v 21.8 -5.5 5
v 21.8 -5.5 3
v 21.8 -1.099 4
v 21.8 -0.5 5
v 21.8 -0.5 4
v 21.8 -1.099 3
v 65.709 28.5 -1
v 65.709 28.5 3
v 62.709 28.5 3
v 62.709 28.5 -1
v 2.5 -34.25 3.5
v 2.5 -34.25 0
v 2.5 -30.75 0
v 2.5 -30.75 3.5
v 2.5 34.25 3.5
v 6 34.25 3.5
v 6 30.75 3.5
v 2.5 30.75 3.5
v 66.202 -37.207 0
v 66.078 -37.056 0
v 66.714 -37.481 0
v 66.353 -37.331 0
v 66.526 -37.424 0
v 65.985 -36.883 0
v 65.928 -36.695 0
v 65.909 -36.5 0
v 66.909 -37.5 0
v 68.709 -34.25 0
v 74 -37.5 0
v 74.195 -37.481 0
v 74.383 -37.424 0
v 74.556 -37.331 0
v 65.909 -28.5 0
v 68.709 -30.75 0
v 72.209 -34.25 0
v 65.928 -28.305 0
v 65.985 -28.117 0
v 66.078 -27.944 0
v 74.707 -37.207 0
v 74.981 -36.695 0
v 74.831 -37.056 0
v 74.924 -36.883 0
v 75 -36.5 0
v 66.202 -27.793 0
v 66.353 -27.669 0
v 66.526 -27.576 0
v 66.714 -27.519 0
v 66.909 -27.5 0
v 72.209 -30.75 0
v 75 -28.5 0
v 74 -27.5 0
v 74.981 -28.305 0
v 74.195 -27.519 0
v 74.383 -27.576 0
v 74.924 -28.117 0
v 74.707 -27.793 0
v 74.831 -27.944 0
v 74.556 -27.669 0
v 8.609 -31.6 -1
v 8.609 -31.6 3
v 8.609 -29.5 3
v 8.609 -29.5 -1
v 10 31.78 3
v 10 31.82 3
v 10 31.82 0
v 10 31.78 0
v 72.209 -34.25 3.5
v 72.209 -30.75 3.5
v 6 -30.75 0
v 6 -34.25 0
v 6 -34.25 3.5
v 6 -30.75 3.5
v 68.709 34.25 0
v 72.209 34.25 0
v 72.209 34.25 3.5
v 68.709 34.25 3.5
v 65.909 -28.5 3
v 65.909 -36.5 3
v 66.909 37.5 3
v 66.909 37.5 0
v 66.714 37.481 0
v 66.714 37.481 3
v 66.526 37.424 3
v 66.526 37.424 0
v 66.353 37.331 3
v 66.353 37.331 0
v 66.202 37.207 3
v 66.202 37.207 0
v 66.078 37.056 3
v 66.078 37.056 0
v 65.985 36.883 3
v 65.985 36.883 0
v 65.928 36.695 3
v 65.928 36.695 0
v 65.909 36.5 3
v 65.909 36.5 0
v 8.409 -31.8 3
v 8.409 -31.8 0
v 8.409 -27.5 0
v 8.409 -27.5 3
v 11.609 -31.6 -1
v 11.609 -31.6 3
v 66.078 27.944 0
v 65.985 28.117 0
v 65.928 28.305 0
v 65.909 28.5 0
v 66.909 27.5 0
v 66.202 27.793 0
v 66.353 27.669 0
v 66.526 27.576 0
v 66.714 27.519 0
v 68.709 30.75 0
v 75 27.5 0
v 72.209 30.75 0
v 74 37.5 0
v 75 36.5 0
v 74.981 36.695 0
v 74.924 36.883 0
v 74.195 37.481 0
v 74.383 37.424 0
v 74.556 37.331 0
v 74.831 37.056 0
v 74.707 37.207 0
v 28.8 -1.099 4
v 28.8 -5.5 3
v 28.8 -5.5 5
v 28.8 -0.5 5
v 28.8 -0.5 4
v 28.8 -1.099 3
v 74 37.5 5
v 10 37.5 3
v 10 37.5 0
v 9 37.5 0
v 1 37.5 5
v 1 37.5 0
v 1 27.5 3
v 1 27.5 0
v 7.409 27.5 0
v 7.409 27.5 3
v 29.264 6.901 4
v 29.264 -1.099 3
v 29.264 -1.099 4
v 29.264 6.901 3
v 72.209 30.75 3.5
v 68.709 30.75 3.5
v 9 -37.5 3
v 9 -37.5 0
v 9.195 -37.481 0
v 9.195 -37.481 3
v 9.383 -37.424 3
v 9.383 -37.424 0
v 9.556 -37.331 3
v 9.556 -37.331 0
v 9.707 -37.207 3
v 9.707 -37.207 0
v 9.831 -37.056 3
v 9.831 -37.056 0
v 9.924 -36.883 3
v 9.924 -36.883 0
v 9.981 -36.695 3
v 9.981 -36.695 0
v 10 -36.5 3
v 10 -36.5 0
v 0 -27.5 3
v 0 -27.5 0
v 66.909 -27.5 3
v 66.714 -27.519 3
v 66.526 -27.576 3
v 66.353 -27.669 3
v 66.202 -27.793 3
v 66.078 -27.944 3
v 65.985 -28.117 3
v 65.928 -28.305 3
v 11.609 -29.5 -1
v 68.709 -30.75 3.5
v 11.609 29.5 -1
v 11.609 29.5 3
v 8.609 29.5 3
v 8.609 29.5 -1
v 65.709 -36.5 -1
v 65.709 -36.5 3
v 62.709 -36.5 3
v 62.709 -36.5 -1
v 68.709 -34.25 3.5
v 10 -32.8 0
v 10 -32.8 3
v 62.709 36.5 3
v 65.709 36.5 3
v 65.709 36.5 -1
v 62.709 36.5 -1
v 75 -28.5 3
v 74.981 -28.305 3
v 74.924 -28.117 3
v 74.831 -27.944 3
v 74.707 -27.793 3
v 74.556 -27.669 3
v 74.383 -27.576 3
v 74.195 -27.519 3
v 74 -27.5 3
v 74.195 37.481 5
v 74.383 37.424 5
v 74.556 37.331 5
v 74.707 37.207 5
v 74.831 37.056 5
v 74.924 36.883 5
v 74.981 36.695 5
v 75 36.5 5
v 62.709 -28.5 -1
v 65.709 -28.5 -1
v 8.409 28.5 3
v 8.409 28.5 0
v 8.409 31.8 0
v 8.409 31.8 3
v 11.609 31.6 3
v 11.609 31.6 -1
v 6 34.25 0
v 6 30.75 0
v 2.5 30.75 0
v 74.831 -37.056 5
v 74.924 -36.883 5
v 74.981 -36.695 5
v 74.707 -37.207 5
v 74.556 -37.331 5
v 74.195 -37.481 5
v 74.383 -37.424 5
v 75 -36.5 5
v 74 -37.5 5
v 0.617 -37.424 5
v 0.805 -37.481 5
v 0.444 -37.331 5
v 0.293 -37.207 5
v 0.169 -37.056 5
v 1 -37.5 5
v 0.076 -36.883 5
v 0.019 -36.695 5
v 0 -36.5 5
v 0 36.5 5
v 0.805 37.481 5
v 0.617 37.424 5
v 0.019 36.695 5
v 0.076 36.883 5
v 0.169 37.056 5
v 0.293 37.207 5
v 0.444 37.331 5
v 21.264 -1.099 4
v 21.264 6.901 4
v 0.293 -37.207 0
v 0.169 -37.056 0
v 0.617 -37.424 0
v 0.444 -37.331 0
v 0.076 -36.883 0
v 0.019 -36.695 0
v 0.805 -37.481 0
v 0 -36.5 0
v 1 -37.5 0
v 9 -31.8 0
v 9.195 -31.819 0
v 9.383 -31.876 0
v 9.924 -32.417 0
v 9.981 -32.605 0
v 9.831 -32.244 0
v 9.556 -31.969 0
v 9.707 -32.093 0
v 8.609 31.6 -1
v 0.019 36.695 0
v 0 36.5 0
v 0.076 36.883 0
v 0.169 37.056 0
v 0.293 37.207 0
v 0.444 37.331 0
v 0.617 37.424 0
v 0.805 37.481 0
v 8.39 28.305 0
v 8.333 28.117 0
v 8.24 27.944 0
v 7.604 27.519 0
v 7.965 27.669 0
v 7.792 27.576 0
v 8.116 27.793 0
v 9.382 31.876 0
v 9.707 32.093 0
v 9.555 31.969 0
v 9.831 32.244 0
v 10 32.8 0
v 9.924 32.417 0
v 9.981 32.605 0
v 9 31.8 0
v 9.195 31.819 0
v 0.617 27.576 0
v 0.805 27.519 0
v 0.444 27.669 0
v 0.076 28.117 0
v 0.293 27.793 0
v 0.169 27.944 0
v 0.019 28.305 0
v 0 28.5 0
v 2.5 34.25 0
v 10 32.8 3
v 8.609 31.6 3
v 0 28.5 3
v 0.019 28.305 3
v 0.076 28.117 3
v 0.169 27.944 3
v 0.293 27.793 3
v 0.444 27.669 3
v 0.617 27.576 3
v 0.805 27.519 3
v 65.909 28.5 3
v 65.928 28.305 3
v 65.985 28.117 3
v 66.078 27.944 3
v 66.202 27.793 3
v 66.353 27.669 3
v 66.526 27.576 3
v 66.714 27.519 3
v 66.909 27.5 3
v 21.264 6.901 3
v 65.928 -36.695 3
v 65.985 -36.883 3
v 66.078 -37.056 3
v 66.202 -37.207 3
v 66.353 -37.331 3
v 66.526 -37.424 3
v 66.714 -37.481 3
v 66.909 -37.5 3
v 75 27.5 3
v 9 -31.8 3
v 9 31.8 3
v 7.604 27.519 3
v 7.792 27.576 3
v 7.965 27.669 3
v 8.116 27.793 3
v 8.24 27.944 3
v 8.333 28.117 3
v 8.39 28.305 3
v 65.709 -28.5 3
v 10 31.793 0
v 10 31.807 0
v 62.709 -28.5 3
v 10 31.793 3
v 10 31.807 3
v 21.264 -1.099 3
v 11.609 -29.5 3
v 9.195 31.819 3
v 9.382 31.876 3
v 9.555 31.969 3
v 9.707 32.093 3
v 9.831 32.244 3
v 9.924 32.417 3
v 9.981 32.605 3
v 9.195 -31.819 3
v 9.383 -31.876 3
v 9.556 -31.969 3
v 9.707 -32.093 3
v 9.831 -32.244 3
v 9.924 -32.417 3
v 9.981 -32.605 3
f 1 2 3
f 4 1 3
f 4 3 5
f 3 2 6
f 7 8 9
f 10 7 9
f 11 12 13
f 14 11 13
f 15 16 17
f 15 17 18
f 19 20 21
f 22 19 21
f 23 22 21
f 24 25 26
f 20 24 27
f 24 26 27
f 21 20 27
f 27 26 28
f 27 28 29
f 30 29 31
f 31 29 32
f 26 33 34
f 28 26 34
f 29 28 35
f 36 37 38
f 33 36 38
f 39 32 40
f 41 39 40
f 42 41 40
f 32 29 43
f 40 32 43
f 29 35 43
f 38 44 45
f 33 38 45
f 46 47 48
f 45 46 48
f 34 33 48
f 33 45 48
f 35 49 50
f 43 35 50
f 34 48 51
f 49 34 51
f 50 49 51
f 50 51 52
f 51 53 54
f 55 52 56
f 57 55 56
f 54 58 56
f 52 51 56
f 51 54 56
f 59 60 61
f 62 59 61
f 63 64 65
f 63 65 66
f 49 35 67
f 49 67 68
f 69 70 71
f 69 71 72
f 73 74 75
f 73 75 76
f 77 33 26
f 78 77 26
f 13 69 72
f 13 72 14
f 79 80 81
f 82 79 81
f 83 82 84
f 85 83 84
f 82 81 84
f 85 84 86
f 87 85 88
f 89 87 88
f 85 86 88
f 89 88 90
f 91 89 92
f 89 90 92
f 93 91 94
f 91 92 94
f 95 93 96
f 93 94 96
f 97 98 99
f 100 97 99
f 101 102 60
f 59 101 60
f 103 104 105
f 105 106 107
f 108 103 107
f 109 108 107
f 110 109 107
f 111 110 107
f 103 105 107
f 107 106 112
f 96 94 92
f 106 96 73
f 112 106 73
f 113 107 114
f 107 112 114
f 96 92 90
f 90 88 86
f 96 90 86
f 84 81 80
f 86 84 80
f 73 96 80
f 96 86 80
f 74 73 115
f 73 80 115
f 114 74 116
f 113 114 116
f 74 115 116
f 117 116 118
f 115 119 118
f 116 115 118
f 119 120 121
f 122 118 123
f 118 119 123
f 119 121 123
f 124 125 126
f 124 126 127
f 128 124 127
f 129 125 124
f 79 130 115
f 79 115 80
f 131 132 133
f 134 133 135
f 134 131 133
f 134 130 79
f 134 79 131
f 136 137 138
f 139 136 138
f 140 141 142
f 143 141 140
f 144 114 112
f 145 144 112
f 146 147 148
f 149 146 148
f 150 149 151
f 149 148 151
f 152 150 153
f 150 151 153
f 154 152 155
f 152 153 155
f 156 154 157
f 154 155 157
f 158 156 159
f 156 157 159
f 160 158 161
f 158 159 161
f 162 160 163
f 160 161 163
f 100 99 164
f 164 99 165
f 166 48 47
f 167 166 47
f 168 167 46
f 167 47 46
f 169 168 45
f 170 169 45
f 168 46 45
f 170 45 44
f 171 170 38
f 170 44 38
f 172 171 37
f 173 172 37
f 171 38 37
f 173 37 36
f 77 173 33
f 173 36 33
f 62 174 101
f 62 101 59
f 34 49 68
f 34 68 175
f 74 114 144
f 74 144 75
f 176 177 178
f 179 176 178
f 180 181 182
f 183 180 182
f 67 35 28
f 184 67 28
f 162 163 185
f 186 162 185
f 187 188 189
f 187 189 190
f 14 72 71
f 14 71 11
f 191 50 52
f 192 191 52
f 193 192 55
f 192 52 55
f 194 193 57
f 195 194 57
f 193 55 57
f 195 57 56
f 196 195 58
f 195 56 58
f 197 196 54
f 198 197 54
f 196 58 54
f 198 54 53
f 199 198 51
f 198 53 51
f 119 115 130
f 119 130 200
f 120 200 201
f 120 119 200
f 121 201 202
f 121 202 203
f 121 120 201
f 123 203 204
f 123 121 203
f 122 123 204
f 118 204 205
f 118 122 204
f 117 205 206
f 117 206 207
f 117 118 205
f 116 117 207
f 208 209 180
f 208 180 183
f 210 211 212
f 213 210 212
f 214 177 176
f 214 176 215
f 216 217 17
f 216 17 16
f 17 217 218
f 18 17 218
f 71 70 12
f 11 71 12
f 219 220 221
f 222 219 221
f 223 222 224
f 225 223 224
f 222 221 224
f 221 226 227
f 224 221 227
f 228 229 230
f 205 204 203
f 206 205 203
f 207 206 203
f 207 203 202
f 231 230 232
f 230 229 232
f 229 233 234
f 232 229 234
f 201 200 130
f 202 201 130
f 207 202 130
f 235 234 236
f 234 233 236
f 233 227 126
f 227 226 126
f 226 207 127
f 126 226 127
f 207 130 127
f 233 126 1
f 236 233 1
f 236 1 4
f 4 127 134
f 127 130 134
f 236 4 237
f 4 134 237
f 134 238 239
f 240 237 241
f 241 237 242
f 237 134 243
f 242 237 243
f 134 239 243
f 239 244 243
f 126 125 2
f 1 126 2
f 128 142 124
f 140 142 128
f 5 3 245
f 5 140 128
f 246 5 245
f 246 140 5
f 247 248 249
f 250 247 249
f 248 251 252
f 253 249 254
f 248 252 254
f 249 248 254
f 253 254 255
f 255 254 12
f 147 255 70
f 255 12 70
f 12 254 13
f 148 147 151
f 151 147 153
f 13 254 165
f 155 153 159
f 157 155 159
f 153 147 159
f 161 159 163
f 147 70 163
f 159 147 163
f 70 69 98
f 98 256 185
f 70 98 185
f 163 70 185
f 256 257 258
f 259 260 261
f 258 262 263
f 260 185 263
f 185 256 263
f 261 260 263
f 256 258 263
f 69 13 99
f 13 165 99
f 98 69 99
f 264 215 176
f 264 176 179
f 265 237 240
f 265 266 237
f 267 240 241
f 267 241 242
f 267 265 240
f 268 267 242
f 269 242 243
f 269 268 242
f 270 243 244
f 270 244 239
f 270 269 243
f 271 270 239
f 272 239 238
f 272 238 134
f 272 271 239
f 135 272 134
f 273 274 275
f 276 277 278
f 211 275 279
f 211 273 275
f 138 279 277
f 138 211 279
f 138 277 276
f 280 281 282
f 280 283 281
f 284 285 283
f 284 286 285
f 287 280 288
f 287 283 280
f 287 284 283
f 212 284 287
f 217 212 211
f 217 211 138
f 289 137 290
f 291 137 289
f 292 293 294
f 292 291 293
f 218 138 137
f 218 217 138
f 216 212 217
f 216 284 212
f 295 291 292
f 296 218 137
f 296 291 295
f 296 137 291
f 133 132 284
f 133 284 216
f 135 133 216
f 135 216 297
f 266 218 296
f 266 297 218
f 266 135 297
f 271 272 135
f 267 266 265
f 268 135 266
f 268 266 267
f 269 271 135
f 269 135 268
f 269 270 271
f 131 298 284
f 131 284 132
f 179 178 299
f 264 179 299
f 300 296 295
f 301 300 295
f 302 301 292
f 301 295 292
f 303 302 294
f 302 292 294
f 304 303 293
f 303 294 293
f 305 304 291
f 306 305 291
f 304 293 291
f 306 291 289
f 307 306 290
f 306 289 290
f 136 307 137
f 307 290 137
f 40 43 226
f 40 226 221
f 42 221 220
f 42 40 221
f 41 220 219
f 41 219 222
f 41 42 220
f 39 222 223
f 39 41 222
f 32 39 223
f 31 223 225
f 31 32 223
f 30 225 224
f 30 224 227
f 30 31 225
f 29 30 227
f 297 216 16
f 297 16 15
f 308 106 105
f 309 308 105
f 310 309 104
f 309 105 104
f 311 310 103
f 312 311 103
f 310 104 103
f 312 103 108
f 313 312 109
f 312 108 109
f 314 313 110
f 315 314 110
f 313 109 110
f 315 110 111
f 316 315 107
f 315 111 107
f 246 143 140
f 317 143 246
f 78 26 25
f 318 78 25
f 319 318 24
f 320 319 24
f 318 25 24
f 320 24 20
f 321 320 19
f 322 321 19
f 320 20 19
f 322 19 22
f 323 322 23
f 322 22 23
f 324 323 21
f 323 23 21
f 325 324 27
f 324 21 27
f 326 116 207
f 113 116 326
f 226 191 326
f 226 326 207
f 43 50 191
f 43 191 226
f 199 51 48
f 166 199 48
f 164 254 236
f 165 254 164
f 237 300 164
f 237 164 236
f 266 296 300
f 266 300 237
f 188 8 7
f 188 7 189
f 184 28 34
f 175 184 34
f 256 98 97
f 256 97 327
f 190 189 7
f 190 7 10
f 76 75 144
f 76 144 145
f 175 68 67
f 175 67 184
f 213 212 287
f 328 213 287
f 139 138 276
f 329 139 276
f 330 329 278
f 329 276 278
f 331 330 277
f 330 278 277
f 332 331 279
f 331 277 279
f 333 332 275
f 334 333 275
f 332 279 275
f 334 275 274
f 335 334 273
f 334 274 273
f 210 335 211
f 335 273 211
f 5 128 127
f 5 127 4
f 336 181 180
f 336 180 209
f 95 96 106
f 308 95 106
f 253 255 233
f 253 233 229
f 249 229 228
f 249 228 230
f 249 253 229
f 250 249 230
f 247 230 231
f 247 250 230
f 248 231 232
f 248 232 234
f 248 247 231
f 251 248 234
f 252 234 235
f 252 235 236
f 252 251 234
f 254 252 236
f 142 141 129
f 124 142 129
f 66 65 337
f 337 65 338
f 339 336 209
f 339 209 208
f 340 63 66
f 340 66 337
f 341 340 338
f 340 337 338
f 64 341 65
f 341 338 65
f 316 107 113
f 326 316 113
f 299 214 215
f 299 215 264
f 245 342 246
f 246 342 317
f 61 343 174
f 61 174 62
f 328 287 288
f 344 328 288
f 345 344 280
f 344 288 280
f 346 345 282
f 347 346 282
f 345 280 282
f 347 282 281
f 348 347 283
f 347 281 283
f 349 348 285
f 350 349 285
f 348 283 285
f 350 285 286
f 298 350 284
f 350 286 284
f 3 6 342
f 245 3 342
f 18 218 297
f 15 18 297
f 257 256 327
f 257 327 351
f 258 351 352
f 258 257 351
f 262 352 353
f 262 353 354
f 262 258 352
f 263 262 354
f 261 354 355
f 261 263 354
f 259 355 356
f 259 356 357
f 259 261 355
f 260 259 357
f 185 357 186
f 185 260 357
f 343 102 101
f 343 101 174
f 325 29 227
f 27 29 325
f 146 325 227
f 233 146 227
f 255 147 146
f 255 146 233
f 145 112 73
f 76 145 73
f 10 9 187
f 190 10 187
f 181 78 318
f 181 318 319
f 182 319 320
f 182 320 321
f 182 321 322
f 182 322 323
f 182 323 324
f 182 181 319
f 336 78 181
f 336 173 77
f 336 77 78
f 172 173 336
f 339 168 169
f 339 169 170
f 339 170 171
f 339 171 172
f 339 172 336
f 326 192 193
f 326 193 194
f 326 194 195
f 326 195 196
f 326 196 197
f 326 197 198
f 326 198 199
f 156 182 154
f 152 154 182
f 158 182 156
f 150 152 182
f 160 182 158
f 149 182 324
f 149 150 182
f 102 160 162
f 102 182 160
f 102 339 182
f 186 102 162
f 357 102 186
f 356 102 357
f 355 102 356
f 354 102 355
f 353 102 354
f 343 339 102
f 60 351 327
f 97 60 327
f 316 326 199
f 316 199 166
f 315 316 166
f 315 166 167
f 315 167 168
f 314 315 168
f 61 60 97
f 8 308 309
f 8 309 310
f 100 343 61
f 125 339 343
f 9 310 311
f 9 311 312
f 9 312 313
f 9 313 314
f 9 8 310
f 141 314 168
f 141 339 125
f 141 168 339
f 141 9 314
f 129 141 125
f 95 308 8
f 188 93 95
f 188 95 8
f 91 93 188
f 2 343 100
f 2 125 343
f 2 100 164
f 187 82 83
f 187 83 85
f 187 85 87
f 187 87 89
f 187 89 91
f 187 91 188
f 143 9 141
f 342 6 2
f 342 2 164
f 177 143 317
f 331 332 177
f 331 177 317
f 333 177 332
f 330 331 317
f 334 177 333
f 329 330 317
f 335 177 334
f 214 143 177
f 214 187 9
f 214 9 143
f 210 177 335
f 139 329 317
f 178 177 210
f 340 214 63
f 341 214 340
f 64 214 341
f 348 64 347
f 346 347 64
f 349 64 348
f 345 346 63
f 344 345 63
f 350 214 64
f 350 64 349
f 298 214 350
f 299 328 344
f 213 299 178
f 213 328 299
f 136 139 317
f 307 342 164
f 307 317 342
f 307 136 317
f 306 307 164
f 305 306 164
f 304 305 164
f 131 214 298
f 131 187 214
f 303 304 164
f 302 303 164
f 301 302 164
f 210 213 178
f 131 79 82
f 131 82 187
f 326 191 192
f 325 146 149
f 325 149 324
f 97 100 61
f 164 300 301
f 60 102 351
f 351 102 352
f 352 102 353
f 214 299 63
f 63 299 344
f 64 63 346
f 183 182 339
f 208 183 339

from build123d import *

# Parameters (mm, degrees)
RESSALTO_EXTRUS_O1_DEPTH   = 3
RESSALTO_EXTRUS_O1_2_DEPTH = 3
RESSALTO_EXTRUS_O1_3_DEPTH = 3
RESSALTO_EXTRUS_O1_4_DEPTH = 3
RESSALTO_EXTRUS_O2_DEPTH   = 2
ESBO_O13_W                 = 0.999795876
ESBO_O13_H                 = 5.679795897
RESSALTO_EXTRUS_O3_DEPTH   = 3
CORTE_EXTRUS_O4_DEPTH      = 3
ESBO_O22_W                 = 3
ESBO_O22_H                 = 2.1
ESBO_O22_H_2               = 8
RESSALTO_EXTRUS_O5_DEPTH   = 4
ESBO_O15_W                 = 3.5
ESBO_O15_H                 = 3.5
CORTE_EXTRUS_O1_DEPTH      = 3.5
ESBO_O16_W                 = 8
ESBO_O16_H                 = 8
CORTE_EXTRUS_O2_DEPTH      = 1
ESBO_O18_W                 = 7
ESBO_O18_H                 = 5
CORTE_EXTRUS_O3_DEPTH      = 10


with BuildPart() as part:
    # Esboço1 → Ressalto-extrusão1 (new body)
    with BuildSketch(Plane.XY):
        with BuildLine():
            Line((10, -36.5), (10, -31.8))
            ThreePointArc((10, -31.8), (9.707106781, -31.092893219), (9, -30.8))
            Line((9, -30.8), (8.409000397, -30.8))
            Line((8.409000397, -30.8), (8.409000397, -27.5))
            Line((8.409000397, -27.5), (0, -27.5))
            Line((0, -27.5), (0, -36.5))
            ThreePointArc((0, -36.5), (0.292893219, -37.207106781), (1, -37.5))
            Line((1, -37.5), (9, -37.5))
            ThreePointArc((9, -37.5), (9.707106781, -37.207106781), (10, -36.5))
        make_face()
    extrude(amount=RESSALTO_EXTRUS_O1_DEPTH)



with BuildPart() as body_2:
    # Esboço1 → Ressalto-extrus_o1 2 (new body)
    with BuildSketch(Plane.XY):
        with BuildLine():
            Line((75, -36.5), (75, -28.5))
            ThreePointArc((75, -28.5), (74.707106781, -27.792893219), (74, -27.5))
            Line((74, -27.5), (66.909000397, -27.5))
            ThreePointArc((66.909000397, -27.5), (66.201893616, -27.792893219), (65.909000397, -28.5))
            Line((65.909000397, -28.5), (65.909000397, -36.5))
            ThreePointArc((65.909000397, -36.5), (66.201893616, -37.207106781), (66.909000397, -37.5))
            Line((66.909000397, -37.5), (74, -37.5))
            ThreePointArc((74, -37.5), (74.707106781, -37.207106781), (75, -36.5))
        make_face()
    extrude(amount=RESSALTO_EXTRUS_O1_2_DEPTH)


with BuildPart() as body_3:
    # Esboço1 → Ressalto-extrus_o1 3 (new body)
    with BuildSketch(Plane.XY):
        with BuildLine():
            Line((65.909000397, 36.5), (65.909000397, 28.5))
            ThreePointArc((65.909000397, 28.5), (66.201893616, 27.792893219), (66.909000397, 27.5))
            Line((66.909000397, 27.5), (75, 27.5))
            Line((75, 27.5), (75, 36.5))
            ThreePointArc((75, 36.5), (74.707106781, 37.207106781), (74, 37.5))
            Line((74, 37.5), (66.909000397, 37.5))
            ThreePointArc((66.909000397, 37.5), (66.201893616, 37.207106781), (65.909000397, 36.5))
        make_face()
    extrude(amount=RESSALTO_EXTRUS_O1_3_DEPTH)


with BuildPart() as body_4:
    # Esboço1 → Ressalto-extrus_o1 4 (new body)
    with BuildSketch(Plane.XY):
        with BuildLine():
            Line((9, 37.5), (1, 37.5))
            ThreePointArc((1, 37.5), (0.292893219, 37.207106781), (0, 36.5))
            Line((0, 36.5), (0, 28.5))
            ThreePointArc((0, 28.5), (0.292893219, 27.792893219), (1, 27.5))
            Line((1, 27.5), (7.409000397, 27.5))
            ThreePointArc((7.409000397, 27.5), (8.116107178, 27.792893219), (8.409000397, 28.5))
            Line((8.409000397, 28.5), (8.409000397, 30.8))
            Line((8.409000397, 30.8), (9, 30.8))
            ThreePointArc((9, 30.8), (9.71421429, 31.100072898), (9.999795876, 31.820204103))
            Line((9.999795876, 31.820204103), (9, 31.820204103))
            Line((9, 31.820204103), (9, 37.5))
        make_face()
    extrude(amount=RESSALTO_EXTRUS_O1_4_DEPTH)


with BuildPart() as part_1:
    add(part.part)

    add(body_2.part)  # Ressalto-extrusão2 merges body 2

    add(body_3.part)  # Ressalto-extrusão2 merges body 3

    add(body_4.part)  # Ressalto-extrusão2 merges body 4
    # Esboço2 → Ressalto-extrusão2 (add)
    with BuildSketch(Plane.XY.offset(3)):
        with BuildLine():
            Line((1, 37.5), (74, 37.5))
            ThreePointArc((74, 37.5), (74.707106781, 37.207106781), (75, 36.5))
            Line((75, 36.5), (75, -36.5))
            ThreePointArc((75, -36.5), (74.707106781, -37.207106781), (74, -37.5))
            Line((74, -37.5), (1, -37.5))
            ThreePointArc((1, -37.5), (0.292893219, -37.207106781), (0, -36.5))
            Line((0, -36.5), (0, 36.5))
            ThreePointArc((0, 36.5), (0.292893219, 37.207106781), (1, 37.5))
        make_face()
    extrude(amount=RESSALTO_EXTRUS_O2_DEPTH)

    # Esboço13 → Ressalto-extrusão3 (add)
    with BuildSketch(Plane(origin=(0, 0, 3), x_dir=(-1, 0, 0), z_dir=(0, 0, -1))):
        with Locations((-9.499897938, 34.660102052)):
            Rectangle(ESBO_O13_W, ESBO_O13_H)
    extrude(amount=RESSALTO_EXTRUS_O3_DEPTH)

    # Esboço20 → Corte-extrusão4 (cut)
    with BuildSketch(Plane(origin=(0, 0, 0), x_dir=(-1, 0, 0), z_dir=(0, 0, -1))):
        with BuildLine():
            Line((-8.409000397, 31.8), (-8.999795876, 31.8))
            ThreePointArc((-8.999795876, 31.8), (-9.706902657, 32.092893219), (-9.999795876, 32.8))
            Line((-9.999795876, 32.8), (-9.999795876, 30.8))
            Line((-9.999795876, 30.8), (-8.409000397, 30.8))
            Line((-8.409000397, 30.8), (-8.409000397, 31.8))
        make_face()
        with BuildLine():
            Line((-8.409000397, -30.8), (-8.409000397, -31.8))
            Line((-8.409000397, -31.8), (-9, -31.8))
            ThreePointArc((-9, -31.8), (-9.707106781, -32.092893219), (-10, -32.8))
            Line((-10, -32.8), (-10, -30.8))
            Line((-10, -30.8), (-8.409000397, -30.8))
        make_face()
    extrude(amount=-CORTE_EXTRUS_O4_DEPTH, mode=Mode.SUBTRACT)

    # Esboço22 → Ressalto-extrusão5 (add)
    with BuildSketch(Plane(origin=(0, 0, 3), x_dir=(-1, 0, 0), z_dir=(0, 0, -1))):
        with Locations((-10.109000397, 30.55)):
            Rectangle(ESBO_O22_W, ESBO_O22_H)
        with Locations((-10.109000397, -30.55)):
            Rectangle(ESBO_O22_W, ESBO_O22_H)
        with Locations((-64.209000397, 32.5)):
            Rectangle(ESBO_O22_W, ESBO_O22_H_2)
        with Locations((-64.209000397, -32.5)):
            Rectangle(ESBO_O22_W, ESBO_O22_H_2)
    extrude(amount=RESSALTO_EXTRUS_O5_DEPTH)

    # Esboço15 → Corte-extrusão1 (cut)
    with BuildSketch(Plane(origin=(0, 0, 0), x_dir=(-1, 0, 0), z_dir=(0, 0, -1))):
        with Locations((-4.25, -32.5)):
            Rectangle(ESBO_O15_W, ESBO_O15_H)
        with Locations((-4.25, 32.5)):
            Rectangle(ESBO_O15_W, ESBO_O15_H)
        with Locations((-70.459000397, 32.5)):
            Rectangle(ESBO_O15_W, ESBO_O15_H)
        with Locations((-70.459000397, -32.5)):
            Rectangle(ESBO_O15_W, ESBO_O15_H)
    extrude(amount=-CORTE_EXTRUS_O1_DEPTH, mode=Mode.SUBTRACT)

    # Esboço16 → Corte-extrusão2 (cut)
    with BuildSketch(Plane(origin=(0, 0, 3), x_dir=(-1, 0, 0), z_dir=(0, 0, -1))):
        with Locations((-25.263712601, 2.900523079)):
            Rectangle(ESBO_O16_W, ESBO_O16_H)
    extrude(amount=-CORTE_EXTRUS_O2_DEPTH, mode=Mode.SUBTRACT)

    # Esboço18 → Corte-extrusão3 (cut)
    with BuildSketch(Plane(origin=(0, 0, 3), x_dir=(-1, 0, 0), z_dir=(0, 0, -1))):
        with Locations((-25.3, -3)):
            Rectangle(ESBO_O18_W, ESBO_O18_H)
    extrude(amount=-CORTE_EXTRUS_O3_DEPTH, mode=Mode.SUBTRACT)


solid = part_1.part
